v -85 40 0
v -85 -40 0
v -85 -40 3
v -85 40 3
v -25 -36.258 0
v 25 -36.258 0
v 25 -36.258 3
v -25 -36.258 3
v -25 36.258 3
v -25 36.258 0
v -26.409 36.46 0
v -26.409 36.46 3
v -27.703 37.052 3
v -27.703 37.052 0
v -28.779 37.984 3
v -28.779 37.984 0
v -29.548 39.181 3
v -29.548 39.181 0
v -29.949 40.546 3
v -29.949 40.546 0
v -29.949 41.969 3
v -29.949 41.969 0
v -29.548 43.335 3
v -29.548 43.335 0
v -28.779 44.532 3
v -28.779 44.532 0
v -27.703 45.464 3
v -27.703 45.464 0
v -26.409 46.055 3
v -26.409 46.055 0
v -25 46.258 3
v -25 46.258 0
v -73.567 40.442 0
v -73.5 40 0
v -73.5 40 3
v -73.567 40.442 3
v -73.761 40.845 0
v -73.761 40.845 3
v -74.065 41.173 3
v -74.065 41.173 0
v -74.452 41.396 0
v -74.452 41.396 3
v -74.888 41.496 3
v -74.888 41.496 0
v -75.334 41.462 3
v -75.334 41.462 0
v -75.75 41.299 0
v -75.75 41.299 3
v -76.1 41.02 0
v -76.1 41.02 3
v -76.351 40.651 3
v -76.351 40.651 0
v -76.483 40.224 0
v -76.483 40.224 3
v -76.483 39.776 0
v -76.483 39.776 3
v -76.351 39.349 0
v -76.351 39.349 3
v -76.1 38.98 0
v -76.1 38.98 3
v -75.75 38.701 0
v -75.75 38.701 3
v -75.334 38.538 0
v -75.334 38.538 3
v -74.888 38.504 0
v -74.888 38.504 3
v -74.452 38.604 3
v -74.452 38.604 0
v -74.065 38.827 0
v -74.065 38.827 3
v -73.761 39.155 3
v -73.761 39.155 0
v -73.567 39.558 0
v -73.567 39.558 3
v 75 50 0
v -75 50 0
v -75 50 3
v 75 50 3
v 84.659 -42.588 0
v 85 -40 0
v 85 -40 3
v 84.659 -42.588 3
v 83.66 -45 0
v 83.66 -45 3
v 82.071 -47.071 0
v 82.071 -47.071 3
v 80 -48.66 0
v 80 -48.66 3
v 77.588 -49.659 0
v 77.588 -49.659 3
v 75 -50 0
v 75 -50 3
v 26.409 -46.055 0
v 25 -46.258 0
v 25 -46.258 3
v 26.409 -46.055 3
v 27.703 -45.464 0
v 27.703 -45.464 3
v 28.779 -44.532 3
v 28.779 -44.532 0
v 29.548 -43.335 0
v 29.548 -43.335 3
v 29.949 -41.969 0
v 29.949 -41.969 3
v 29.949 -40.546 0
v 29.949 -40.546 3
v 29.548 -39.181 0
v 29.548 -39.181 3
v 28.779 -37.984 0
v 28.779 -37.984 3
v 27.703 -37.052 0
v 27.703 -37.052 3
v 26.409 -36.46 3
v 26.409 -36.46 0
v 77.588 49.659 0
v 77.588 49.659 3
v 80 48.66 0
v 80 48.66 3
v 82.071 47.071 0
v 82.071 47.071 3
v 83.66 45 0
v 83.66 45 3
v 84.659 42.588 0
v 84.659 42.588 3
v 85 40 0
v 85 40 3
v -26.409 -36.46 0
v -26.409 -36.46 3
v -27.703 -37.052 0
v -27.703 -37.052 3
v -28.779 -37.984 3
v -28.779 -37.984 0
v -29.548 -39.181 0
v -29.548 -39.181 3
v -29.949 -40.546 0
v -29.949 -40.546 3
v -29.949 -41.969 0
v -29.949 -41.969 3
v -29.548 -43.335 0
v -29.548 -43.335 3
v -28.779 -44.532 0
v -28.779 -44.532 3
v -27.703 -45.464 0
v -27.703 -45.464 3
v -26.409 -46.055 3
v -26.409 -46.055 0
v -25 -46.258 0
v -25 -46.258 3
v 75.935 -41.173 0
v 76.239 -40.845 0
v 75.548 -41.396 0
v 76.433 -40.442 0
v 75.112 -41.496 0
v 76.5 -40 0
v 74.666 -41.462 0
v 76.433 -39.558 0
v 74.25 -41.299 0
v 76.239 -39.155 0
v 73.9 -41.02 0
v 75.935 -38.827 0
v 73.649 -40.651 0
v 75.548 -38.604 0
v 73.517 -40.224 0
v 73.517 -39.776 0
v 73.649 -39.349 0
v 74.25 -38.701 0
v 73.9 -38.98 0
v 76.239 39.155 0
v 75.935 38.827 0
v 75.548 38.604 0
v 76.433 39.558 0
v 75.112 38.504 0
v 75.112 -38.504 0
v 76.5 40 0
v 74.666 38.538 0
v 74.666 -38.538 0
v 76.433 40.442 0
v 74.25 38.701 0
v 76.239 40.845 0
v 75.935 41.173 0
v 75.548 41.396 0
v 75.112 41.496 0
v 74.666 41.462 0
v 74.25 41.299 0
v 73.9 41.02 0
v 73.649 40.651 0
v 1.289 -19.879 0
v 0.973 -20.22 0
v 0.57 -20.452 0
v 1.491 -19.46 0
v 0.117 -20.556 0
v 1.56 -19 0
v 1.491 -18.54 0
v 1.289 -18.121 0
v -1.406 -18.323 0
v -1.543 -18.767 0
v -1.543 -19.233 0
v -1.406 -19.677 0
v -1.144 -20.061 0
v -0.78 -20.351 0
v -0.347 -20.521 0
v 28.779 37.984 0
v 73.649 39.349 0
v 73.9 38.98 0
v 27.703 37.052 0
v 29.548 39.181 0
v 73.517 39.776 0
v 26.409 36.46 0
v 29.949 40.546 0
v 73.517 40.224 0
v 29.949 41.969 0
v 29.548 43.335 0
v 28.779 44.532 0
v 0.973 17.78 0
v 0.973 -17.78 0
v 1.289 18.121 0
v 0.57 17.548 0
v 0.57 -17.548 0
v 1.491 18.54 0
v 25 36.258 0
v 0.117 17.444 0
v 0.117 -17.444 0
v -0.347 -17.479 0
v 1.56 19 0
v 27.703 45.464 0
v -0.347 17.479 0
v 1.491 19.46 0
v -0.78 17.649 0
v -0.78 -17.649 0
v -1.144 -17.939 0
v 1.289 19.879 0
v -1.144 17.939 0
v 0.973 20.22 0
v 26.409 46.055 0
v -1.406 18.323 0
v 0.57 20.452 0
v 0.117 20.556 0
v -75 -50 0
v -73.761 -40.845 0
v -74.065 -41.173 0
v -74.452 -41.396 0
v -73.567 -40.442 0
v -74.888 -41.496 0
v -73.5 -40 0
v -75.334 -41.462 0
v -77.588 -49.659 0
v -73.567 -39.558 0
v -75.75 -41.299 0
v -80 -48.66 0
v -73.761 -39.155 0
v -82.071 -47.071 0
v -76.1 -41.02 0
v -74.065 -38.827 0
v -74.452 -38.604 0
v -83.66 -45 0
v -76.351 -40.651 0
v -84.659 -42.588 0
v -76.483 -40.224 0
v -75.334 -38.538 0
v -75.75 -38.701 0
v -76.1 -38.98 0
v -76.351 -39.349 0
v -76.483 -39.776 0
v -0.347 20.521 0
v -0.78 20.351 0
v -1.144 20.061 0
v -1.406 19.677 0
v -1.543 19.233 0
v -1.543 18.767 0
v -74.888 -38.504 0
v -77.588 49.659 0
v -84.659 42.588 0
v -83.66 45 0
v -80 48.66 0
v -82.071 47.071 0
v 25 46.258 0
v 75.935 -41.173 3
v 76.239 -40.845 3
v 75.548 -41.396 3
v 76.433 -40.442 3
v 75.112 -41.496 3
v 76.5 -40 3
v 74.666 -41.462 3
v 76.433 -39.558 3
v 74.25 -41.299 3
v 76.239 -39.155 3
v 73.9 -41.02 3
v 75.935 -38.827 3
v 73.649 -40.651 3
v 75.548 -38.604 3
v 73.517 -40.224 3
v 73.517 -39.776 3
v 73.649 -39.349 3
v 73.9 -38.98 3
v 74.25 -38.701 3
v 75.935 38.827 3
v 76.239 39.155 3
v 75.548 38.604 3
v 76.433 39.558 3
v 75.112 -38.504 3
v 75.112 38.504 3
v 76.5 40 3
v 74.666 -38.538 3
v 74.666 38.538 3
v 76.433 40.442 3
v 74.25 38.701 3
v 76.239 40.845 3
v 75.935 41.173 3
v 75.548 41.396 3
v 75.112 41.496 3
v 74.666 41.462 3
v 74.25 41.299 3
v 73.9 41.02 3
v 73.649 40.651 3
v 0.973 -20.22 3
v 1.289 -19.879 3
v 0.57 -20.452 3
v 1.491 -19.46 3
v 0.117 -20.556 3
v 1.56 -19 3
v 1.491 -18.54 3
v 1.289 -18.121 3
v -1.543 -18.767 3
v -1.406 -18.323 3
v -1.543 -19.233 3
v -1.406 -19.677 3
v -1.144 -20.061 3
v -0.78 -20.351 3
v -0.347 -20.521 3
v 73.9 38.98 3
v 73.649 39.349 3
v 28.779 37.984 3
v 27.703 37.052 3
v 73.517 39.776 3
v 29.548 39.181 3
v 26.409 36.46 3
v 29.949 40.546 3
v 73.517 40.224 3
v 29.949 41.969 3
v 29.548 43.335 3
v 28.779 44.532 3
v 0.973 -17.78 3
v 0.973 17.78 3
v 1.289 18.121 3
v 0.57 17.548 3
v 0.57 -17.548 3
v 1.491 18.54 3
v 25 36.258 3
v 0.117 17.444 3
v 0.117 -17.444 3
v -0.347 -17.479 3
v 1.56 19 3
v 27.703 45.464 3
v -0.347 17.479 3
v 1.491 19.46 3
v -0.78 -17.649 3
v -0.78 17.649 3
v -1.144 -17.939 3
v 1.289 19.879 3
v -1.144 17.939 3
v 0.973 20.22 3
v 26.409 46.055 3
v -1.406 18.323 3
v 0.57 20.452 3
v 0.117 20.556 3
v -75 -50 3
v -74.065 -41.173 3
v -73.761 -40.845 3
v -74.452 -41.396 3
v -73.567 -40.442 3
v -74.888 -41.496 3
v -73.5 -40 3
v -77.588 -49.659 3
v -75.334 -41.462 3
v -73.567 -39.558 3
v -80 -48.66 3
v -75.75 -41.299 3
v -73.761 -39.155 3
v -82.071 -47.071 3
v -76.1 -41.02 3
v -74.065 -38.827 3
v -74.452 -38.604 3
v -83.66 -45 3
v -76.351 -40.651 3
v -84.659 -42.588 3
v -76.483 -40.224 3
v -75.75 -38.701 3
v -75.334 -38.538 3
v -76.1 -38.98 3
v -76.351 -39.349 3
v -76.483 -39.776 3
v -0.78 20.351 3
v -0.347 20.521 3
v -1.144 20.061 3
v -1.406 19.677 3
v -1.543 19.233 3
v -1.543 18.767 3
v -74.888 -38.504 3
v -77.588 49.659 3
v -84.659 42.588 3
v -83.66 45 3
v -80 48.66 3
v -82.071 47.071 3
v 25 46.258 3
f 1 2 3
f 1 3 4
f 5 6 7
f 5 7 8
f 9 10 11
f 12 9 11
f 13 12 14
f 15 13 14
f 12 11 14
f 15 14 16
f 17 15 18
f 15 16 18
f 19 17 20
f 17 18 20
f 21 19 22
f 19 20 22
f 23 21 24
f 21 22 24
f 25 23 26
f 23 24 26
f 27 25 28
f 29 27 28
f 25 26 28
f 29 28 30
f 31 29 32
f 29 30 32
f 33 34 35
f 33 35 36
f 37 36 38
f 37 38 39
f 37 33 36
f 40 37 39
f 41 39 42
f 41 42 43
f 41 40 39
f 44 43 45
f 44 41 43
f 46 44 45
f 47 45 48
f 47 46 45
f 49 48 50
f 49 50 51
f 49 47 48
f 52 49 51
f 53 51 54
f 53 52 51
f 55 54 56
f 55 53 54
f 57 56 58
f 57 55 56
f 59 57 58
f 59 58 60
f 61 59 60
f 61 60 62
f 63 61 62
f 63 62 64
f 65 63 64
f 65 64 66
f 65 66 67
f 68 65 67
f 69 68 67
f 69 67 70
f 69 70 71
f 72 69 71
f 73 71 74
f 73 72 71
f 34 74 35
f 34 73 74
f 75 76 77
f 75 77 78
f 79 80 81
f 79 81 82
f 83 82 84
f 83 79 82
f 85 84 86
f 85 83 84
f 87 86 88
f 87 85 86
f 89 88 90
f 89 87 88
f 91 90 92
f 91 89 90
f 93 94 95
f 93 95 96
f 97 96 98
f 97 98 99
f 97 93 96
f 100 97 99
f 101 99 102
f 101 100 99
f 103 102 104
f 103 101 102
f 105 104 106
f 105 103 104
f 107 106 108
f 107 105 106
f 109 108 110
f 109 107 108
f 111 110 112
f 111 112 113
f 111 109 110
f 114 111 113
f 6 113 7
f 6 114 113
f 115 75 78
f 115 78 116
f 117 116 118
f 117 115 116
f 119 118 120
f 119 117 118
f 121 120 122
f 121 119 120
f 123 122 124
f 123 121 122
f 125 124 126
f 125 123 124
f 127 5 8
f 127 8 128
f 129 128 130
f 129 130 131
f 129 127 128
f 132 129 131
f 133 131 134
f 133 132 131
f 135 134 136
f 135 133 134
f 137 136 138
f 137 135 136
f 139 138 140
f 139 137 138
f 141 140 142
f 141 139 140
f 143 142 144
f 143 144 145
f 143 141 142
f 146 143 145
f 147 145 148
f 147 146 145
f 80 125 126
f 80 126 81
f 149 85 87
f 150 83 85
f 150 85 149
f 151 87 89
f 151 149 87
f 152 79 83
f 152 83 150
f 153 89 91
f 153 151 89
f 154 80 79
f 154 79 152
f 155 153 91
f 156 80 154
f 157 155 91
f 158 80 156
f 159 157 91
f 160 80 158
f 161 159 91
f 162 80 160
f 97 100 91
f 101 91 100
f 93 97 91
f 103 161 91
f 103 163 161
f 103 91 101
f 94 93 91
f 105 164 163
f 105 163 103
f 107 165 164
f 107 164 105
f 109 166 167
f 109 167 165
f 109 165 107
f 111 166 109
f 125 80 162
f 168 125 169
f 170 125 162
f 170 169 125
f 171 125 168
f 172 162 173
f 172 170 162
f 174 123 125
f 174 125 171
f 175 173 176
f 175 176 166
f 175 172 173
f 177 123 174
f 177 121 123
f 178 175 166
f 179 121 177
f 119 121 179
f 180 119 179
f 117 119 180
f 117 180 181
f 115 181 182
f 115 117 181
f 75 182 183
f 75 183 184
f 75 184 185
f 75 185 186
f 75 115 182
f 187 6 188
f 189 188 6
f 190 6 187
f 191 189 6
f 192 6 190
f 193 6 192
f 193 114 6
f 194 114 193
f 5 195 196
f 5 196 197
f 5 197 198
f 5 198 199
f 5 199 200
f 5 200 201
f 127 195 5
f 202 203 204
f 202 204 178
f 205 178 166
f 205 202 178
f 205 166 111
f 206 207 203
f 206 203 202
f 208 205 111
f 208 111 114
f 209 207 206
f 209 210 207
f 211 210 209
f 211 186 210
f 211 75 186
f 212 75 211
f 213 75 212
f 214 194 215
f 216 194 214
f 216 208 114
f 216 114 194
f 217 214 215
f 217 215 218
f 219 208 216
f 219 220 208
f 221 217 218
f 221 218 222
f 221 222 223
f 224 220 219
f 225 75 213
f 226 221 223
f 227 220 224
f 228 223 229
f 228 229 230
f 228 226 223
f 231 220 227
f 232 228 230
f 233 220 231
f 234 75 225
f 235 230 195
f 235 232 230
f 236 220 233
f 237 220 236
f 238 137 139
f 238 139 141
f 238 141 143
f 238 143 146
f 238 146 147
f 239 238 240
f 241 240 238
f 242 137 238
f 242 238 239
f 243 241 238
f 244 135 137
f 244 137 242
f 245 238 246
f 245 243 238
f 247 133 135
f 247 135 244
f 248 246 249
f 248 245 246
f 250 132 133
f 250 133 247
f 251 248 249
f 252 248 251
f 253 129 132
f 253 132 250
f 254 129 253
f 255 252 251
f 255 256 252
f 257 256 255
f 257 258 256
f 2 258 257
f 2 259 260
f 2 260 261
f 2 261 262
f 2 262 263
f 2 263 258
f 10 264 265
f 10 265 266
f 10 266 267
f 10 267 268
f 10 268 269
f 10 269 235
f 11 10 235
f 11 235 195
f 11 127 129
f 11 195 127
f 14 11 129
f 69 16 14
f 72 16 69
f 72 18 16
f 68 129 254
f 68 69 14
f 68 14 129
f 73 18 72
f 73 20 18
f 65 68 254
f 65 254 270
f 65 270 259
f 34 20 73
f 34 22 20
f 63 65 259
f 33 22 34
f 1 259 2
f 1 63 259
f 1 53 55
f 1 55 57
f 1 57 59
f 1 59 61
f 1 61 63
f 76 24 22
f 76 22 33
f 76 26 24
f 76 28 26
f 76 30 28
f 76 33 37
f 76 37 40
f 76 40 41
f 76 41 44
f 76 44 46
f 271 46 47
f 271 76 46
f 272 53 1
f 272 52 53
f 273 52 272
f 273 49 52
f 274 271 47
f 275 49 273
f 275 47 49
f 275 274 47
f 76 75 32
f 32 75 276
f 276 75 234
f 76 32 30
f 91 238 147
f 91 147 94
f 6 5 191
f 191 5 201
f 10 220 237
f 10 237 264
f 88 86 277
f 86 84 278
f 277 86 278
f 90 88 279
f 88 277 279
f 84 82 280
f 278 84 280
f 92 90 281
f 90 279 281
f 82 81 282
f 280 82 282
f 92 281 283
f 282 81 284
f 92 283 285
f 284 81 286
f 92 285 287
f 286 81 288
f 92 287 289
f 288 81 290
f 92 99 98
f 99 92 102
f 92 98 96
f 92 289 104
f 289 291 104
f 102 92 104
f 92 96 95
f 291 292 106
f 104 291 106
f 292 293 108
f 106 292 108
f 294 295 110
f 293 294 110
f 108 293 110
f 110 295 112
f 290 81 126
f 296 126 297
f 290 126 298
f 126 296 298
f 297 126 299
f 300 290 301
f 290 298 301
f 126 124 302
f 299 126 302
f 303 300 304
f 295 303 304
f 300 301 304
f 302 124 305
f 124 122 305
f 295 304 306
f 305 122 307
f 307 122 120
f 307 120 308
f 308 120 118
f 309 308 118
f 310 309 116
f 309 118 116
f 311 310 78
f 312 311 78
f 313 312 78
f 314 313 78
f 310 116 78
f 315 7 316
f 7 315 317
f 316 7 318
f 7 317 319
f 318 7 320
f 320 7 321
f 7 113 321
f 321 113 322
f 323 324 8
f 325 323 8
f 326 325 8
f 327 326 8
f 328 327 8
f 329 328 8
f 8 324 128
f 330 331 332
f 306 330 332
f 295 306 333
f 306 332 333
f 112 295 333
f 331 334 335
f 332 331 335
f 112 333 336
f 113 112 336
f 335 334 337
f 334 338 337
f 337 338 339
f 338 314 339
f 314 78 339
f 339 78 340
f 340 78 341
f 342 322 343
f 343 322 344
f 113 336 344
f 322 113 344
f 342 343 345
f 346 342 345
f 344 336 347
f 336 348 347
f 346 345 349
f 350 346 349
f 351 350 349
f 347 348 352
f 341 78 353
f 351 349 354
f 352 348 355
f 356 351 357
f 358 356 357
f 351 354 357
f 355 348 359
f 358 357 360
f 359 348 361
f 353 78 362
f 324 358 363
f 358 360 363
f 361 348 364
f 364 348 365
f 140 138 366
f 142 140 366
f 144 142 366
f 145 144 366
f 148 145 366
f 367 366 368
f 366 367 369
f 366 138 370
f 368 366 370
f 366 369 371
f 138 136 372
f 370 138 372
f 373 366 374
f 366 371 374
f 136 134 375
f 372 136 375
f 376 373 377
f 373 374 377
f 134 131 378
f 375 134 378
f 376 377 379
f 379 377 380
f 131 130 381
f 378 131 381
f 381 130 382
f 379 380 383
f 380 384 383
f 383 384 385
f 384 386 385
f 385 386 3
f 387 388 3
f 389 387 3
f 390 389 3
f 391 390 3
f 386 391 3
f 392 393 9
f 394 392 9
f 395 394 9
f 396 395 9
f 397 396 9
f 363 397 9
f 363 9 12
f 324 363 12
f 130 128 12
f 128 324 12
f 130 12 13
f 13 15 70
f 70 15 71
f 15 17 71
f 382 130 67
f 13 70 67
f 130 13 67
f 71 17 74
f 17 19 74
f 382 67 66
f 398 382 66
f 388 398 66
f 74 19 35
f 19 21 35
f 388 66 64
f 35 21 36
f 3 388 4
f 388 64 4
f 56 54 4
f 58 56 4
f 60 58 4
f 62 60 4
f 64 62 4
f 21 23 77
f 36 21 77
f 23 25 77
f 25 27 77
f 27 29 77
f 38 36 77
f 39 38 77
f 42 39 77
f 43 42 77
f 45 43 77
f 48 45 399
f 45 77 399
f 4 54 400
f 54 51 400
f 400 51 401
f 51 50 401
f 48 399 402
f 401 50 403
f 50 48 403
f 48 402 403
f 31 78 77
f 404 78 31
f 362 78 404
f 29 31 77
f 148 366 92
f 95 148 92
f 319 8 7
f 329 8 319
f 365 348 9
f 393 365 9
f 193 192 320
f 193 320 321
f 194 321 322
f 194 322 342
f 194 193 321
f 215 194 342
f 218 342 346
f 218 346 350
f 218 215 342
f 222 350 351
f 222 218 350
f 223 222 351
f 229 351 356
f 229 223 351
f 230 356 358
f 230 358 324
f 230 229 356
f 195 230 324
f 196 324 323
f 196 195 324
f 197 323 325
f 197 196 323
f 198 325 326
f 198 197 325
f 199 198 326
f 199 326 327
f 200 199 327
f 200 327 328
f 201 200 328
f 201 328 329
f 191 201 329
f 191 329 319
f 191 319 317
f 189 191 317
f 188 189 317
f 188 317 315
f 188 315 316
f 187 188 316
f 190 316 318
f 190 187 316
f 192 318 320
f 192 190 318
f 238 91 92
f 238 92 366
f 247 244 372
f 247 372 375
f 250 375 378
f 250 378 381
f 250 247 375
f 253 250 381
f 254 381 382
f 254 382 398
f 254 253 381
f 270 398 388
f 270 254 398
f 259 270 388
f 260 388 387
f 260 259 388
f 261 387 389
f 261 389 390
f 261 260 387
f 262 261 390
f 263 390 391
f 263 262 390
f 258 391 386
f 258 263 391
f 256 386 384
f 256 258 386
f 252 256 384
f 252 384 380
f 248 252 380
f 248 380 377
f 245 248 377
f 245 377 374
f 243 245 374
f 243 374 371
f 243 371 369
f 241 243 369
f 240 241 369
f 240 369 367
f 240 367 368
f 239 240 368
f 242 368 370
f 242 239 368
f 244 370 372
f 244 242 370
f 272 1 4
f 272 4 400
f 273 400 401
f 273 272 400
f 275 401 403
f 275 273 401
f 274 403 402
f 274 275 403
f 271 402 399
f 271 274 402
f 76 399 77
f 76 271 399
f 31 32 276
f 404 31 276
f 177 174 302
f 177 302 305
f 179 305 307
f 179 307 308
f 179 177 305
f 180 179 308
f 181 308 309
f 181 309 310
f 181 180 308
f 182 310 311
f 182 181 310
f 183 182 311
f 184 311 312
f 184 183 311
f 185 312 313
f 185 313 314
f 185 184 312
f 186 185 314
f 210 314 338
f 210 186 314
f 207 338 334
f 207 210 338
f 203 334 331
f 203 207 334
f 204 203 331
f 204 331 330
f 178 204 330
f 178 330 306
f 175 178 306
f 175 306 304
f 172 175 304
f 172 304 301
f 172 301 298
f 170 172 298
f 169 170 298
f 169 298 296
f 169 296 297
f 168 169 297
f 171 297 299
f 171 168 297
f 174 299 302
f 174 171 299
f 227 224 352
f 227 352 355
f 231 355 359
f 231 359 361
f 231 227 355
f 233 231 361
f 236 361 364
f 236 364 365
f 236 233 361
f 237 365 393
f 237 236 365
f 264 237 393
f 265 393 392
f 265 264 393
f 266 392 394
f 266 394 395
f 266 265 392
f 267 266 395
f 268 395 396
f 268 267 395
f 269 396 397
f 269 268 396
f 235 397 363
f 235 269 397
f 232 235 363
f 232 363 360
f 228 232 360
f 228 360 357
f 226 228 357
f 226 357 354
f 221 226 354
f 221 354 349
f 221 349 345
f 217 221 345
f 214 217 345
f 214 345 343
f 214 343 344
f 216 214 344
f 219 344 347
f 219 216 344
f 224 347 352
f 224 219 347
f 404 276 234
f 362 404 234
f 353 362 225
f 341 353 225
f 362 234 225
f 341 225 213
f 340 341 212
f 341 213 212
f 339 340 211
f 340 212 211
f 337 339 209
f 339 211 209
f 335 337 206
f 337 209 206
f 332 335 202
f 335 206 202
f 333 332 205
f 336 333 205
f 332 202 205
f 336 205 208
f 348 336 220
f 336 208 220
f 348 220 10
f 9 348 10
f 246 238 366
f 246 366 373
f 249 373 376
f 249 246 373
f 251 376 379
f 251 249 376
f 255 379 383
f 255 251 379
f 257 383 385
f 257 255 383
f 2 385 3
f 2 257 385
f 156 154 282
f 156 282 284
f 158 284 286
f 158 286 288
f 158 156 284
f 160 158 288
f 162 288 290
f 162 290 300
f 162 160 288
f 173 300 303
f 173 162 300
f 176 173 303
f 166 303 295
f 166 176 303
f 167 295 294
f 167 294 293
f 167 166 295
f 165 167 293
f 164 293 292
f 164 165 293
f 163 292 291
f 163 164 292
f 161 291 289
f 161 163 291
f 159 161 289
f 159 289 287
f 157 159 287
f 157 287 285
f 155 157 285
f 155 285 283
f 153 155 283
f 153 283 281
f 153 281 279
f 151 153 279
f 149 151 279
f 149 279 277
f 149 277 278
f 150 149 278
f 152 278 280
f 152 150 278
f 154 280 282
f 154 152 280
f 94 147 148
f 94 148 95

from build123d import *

# Parameters (mm, degrees)
SKETCH1_R           = 1.5
SKETCH1_R_2         = 1.56
BOSS_EXTRUDE1_DEPTH = 3


with BuildPart() as part:
    # Sketch1 → Boss-Extrude1 (new body)
    with BuildSketch(Plane.XY):
        with BuildLine():
            Line((-75, 50), (75, 50))
            ThreePointArc((75, 50), (82.071067812, 47.071067812), (85, 40))
            Line((85, 40), (85, -40))
            ThreePointArc((85, -40), (82.071067812, -47.071067812), (75, -50))
            Line((75, -50), (-75, -50))
            ThreePointArc((-75, -50), (-82.071067812, -47.071067812), (-85, -40))
            Line((-85, -40), (-85, 40))
            ThreePointArc((-85, 40), (-82.071067812, 47.071067812), (-75, 50))
        make_face()
        with Locations((-75, 40)):
            Circle(SKETCH1_R, mode=Mode.SUBTRACT)
        with Locations((75, 40)):
            Circle(SKETCH1_R, mode=Mode.SUBTRACT)
        with Locations((75, -40)):
            Circle(SKETCH1_R, mode=Mode.SUBTRACT)
        with Locations((-75, -40)):
            Circle(SKETCH1_R, mode=Mode.SUBTRACT)
        with Locations((0, 19)):
            Circle(SKETCH1_R_2, mode=Mode.SUBTRACT)
        with Locations((0, -19)):
            Circle(SKETCH1_R_2, mode=Mode.SUBTRACT)
        with BuildLine():
            Line((-25, 46.257829906), (25, 46.257829906))
            ThreePointArc((25, 46.257829906), (30, 41.257829906), (25, 36.257829906))
            Line((25, 36.257829906), (-25, 36.257829906))
            ThreePointArc((-25, 36.257829906), (-30, 41.257829906), (-25, 46.257829906))
        make_face(mode=Mode.SUBTRACT)
        with BuildLine():
            Line((-25, -46.257829906), (25, -46.257829906))
            ThreePointArc((25, -46.257829906), (30, -41.257829906), (25, -36.257829906))
            Line((25, -36.257829906), (-25, -36.257829906))
            ThreePointArc((-25, -36.257829906), (-30, -41.257829906), (-25, -46.257829906))
        make_face(mode=Mode.SUBTRACT)
    extrude(amount=BOSS_EXTRUDE1_DEPTH)


solid = part.part
